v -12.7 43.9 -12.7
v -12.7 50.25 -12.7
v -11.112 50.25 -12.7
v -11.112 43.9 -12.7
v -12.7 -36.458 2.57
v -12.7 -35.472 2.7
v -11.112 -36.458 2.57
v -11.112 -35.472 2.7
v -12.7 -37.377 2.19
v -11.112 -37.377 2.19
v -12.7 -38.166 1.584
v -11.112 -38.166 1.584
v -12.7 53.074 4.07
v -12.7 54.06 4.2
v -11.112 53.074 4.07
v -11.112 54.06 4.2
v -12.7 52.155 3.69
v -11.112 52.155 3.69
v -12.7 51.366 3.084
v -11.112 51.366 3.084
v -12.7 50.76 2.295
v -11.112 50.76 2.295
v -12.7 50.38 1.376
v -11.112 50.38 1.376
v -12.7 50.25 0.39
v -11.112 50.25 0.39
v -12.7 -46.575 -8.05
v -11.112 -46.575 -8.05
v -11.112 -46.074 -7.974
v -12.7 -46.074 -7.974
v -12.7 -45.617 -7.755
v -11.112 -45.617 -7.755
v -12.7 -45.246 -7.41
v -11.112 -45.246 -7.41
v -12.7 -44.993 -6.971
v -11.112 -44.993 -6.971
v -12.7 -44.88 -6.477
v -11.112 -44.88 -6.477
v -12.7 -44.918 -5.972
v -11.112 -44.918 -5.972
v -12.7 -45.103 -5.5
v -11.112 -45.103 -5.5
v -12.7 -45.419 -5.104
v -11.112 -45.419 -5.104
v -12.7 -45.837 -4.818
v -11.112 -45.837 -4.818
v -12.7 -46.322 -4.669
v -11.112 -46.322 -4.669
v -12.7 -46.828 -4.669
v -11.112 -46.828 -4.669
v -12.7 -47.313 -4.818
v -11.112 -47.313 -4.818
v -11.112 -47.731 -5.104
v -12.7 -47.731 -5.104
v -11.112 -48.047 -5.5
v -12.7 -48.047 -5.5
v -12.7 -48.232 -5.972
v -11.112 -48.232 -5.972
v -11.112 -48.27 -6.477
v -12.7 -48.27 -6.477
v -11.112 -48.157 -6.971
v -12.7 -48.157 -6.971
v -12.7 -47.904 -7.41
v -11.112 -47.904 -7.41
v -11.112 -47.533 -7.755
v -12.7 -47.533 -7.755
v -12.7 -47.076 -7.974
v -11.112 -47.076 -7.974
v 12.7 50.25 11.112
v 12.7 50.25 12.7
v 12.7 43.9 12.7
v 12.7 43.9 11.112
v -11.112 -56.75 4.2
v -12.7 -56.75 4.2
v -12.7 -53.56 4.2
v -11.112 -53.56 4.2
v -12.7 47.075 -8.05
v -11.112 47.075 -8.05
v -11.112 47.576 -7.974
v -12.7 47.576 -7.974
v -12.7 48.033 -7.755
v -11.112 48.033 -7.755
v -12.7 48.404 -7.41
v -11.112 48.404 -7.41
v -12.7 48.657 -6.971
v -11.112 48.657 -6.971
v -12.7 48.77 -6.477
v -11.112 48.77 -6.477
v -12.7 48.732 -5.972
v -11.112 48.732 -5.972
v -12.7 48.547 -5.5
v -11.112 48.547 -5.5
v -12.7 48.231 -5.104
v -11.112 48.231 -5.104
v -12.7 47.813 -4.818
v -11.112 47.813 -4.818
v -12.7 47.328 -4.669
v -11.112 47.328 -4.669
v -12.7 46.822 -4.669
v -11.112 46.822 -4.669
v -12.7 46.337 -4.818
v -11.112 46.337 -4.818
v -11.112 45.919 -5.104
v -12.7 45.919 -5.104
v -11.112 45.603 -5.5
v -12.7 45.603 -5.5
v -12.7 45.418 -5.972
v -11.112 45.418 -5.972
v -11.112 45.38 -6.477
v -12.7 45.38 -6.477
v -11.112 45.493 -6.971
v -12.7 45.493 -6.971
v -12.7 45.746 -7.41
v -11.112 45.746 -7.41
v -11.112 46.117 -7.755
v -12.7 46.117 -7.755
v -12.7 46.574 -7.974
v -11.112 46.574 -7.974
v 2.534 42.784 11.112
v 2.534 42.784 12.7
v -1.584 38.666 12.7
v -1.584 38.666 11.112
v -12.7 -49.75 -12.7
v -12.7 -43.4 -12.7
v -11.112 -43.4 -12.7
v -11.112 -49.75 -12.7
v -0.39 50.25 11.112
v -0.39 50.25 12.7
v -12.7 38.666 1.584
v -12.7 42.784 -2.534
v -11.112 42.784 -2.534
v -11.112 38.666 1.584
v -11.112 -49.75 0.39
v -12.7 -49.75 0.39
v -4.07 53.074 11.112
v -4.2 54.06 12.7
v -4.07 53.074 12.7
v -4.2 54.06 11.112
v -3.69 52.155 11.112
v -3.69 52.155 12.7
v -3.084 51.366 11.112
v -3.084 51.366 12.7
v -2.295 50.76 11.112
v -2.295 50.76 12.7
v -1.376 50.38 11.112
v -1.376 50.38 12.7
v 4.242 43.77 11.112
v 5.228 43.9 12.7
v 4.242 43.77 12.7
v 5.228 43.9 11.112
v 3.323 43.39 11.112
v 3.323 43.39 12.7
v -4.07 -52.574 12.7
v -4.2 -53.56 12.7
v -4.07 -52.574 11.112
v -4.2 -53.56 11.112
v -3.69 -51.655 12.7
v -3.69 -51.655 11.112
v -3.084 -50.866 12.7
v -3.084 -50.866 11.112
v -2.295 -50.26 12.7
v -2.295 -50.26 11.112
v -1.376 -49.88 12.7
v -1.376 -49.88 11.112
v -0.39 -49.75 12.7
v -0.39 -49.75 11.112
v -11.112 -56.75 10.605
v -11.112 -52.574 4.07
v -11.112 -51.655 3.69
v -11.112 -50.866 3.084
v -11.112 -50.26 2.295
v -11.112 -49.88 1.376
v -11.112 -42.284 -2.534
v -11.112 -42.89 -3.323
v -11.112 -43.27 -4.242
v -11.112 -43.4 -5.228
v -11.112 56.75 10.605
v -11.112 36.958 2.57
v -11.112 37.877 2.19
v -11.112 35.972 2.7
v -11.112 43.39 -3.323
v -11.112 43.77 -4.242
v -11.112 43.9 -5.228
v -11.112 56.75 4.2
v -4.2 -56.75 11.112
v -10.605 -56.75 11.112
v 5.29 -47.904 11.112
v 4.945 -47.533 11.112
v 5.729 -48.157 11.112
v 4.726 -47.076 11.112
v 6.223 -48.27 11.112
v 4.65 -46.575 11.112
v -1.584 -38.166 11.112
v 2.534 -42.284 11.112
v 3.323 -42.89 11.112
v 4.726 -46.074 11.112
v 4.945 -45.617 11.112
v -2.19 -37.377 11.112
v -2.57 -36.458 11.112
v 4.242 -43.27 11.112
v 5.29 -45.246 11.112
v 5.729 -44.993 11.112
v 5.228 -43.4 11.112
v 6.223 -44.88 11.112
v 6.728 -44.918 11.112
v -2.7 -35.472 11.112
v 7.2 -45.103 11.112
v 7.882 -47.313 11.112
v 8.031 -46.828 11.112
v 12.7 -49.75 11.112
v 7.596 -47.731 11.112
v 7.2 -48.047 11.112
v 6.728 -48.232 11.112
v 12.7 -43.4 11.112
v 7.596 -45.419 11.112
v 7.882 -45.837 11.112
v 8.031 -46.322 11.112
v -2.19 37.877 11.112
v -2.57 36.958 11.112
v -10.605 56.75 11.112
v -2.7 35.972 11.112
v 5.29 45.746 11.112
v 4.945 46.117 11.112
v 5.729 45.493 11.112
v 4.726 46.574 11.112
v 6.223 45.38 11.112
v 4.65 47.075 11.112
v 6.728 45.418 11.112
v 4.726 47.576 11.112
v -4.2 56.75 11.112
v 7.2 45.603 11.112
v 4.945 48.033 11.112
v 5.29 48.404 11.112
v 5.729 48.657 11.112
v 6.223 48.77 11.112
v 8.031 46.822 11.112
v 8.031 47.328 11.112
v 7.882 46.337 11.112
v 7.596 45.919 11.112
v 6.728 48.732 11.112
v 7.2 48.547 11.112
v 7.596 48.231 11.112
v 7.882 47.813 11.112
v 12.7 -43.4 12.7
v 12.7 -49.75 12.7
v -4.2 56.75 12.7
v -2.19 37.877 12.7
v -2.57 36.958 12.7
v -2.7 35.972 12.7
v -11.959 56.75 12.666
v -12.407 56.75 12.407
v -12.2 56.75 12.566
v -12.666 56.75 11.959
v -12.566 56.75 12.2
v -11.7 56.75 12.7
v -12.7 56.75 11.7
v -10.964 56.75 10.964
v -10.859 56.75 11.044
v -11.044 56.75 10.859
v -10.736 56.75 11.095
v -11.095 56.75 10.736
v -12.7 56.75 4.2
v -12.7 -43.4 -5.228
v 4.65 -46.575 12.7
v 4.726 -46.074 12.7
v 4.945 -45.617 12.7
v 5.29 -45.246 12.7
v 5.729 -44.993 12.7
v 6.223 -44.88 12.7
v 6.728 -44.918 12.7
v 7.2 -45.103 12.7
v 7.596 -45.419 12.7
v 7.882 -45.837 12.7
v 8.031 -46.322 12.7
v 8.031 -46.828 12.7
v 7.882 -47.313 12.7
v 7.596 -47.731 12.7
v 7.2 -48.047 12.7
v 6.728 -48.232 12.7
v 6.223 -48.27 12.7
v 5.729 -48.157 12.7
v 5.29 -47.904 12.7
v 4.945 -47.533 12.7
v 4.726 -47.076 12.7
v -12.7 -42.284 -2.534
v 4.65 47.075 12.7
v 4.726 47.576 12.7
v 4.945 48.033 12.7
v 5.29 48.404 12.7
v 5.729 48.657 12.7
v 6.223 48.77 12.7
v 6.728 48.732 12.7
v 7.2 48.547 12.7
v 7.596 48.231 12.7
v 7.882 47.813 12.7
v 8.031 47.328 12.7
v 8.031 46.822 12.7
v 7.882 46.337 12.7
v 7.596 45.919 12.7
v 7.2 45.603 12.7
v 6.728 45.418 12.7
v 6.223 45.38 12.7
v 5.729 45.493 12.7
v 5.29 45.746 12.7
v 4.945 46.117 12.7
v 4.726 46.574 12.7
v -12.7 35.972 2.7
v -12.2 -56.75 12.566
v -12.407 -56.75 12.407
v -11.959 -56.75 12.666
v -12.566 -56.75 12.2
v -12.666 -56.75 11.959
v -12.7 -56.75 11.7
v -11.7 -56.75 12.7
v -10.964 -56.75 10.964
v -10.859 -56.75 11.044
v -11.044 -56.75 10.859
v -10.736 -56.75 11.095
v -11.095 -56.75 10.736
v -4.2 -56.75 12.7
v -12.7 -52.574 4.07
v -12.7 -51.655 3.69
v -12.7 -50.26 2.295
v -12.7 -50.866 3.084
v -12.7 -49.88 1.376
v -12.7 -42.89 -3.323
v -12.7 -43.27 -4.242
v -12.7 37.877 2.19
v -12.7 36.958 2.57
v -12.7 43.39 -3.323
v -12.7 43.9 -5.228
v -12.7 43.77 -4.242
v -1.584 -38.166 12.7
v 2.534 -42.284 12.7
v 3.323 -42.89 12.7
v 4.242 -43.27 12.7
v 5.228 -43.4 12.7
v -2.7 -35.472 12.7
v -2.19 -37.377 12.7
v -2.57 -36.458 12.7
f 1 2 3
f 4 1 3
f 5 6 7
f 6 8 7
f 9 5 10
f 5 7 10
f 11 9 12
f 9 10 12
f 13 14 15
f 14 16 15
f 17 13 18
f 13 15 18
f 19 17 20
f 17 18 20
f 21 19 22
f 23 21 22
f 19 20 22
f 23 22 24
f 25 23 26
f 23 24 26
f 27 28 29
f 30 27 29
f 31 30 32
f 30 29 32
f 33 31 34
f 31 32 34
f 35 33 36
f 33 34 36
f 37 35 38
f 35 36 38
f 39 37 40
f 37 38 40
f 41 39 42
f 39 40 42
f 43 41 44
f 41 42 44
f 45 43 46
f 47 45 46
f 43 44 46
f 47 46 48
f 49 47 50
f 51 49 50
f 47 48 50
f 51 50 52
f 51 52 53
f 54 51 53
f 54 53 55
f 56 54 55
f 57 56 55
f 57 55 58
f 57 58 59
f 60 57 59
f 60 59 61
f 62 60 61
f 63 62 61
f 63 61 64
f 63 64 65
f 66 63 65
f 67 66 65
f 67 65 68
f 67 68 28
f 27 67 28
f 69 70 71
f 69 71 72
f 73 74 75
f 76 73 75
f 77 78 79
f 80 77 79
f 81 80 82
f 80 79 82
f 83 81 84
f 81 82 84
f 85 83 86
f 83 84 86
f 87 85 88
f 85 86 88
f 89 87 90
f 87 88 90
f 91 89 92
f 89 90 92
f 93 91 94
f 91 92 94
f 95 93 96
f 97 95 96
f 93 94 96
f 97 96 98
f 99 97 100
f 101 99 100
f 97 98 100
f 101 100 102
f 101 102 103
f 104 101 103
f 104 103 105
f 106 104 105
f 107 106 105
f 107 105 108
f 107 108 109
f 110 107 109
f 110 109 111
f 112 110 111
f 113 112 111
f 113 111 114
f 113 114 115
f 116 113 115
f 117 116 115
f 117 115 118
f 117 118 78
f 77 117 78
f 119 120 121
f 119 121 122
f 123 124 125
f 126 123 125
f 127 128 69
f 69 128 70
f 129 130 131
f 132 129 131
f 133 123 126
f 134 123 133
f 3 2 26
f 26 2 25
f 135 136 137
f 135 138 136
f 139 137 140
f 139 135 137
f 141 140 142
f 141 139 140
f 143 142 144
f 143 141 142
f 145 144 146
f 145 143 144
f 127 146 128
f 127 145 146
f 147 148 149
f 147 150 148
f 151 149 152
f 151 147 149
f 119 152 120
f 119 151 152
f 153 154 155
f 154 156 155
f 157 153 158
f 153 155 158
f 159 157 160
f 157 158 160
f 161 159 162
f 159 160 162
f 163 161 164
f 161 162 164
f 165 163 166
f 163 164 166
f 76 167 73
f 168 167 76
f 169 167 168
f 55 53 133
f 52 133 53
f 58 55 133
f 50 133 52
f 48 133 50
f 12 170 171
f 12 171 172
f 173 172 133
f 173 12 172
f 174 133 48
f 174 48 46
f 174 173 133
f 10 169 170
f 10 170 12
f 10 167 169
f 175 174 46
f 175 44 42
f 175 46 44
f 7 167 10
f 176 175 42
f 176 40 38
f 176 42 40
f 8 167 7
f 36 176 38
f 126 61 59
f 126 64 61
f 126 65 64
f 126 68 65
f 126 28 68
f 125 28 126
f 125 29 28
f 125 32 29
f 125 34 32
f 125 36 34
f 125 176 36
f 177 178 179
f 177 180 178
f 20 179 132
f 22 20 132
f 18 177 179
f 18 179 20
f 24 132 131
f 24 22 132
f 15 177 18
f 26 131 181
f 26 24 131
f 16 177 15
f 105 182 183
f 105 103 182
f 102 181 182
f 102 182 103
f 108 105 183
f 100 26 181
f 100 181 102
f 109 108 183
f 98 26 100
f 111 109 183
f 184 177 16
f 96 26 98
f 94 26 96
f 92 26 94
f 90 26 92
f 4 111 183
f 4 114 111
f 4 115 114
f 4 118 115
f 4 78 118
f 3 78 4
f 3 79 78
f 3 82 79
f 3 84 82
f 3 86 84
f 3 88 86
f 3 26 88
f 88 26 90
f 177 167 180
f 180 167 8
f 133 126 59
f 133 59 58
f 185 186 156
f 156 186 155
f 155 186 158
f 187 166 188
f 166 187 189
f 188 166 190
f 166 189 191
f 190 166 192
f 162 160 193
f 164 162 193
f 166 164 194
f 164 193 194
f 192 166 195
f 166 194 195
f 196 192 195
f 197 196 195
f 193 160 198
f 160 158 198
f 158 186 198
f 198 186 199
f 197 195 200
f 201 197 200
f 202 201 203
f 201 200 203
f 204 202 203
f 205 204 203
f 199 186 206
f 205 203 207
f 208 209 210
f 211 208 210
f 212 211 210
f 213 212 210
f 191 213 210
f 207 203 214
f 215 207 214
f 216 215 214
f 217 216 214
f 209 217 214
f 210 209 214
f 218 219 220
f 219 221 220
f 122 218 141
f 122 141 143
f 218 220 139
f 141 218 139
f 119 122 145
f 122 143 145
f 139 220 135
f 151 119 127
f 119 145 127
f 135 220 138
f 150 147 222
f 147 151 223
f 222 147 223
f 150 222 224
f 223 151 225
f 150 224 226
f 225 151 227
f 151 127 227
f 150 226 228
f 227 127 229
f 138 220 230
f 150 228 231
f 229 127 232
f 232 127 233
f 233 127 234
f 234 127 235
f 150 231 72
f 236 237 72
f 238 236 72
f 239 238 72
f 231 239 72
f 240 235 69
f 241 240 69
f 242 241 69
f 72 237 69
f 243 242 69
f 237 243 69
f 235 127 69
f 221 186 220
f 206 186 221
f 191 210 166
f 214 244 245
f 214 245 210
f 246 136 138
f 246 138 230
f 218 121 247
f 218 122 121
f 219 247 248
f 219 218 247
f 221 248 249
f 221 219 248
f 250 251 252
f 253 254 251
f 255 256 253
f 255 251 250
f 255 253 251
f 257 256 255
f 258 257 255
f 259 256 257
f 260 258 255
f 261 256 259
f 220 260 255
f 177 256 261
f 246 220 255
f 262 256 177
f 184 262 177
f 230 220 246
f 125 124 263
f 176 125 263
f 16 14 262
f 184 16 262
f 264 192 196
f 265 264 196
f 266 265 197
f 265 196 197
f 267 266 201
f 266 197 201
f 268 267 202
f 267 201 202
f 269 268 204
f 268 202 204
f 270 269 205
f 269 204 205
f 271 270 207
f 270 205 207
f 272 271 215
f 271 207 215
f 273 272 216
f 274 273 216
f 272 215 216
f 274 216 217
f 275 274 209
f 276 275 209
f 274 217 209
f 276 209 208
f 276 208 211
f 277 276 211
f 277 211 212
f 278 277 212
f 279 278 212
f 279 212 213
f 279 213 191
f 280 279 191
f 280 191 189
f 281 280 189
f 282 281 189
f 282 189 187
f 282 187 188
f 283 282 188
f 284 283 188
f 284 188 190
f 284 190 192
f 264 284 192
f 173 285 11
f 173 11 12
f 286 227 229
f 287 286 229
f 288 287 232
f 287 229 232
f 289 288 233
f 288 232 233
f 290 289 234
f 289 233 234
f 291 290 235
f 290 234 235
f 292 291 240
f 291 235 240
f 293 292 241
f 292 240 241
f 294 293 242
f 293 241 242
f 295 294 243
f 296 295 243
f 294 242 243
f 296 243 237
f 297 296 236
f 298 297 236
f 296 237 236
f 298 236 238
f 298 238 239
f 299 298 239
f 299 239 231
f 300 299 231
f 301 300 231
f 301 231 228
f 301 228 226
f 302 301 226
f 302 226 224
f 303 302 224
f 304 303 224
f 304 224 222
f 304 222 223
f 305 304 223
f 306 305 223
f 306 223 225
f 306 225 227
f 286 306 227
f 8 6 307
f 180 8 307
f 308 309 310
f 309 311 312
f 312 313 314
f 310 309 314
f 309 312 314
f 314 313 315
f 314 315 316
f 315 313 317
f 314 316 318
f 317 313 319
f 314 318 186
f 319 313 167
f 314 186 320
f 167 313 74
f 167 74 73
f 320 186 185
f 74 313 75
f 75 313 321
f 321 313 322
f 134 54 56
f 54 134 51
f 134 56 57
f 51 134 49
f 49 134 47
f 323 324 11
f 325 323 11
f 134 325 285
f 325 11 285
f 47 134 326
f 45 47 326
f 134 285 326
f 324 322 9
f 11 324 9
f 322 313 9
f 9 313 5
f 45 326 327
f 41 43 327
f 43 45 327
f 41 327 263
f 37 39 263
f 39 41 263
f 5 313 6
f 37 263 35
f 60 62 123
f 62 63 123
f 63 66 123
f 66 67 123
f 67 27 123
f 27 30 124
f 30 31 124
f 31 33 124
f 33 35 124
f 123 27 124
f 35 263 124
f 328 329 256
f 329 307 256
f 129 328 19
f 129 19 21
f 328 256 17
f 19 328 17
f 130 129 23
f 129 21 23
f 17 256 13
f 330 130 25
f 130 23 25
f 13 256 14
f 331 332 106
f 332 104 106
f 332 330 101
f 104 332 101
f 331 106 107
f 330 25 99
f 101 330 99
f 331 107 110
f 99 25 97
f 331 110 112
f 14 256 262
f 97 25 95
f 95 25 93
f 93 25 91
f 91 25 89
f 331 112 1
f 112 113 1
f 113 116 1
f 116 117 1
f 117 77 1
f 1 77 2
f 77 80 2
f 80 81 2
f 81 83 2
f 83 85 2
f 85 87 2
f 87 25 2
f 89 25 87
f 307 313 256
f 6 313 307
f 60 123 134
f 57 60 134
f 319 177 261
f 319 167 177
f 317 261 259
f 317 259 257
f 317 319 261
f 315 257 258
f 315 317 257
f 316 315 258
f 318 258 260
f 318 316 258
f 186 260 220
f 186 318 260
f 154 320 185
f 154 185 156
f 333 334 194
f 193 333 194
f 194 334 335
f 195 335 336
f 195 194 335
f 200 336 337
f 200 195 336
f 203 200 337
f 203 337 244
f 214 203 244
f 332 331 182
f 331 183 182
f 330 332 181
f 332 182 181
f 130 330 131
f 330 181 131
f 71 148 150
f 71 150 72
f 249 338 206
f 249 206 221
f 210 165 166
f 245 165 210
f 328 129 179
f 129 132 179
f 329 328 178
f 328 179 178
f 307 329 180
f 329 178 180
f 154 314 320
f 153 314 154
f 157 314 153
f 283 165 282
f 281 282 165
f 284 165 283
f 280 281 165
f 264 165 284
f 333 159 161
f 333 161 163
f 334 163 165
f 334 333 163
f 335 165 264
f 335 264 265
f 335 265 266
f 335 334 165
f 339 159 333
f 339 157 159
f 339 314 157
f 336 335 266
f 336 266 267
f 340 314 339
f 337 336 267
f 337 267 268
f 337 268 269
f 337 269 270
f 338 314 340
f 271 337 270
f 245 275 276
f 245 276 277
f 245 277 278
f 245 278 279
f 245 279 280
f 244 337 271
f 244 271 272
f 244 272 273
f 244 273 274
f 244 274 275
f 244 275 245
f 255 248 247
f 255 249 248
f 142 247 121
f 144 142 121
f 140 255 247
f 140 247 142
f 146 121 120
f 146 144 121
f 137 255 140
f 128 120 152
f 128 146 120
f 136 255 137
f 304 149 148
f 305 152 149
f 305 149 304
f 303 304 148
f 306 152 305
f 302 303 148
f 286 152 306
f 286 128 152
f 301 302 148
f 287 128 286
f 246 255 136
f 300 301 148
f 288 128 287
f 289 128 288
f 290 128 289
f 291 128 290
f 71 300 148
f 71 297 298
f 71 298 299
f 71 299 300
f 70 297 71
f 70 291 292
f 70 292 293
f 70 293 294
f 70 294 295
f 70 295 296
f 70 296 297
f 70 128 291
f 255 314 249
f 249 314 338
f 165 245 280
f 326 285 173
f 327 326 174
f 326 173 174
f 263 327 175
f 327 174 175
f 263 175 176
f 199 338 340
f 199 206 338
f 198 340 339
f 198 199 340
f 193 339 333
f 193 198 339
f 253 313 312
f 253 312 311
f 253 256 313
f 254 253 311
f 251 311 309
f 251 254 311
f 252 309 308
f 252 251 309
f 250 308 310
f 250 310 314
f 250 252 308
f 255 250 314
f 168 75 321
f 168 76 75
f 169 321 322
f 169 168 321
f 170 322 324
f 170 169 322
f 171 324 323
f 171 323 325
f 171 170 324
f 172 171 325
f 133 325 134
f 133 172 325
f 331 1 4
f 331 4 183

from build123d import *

# Parameters (mm, degrees)
SKETCH1_W            = 25.4
SKETCH1_H            = 25.4
BOSS_EXTRUDE1_DEPTH  = 56.75
SKETCH2_W            = 23.8125
SKETCH2_H            = 23.8125
CUT_EXTRUDE1_DEPTH   = 115.912270885
FILLET1_R            = 0.508
M3_CLEARANCE_HOLE1_D = 3.4
M3_CLEARANCE_HOLE2_D = 3.4
M3_CLEARANCE_HOLE3_D = 3.4
M3_CLEARANCE_HOLE4_D = 3.4
FILLET2_R            = 1
CUT_EXTRUDE2_REACH   = 65.459
SKETCH11_W           = 16.9
SKETCH11_H           = 6.499999954
SKETCH11_H_2         = 7
CUT_EXTRUDE3_REACH   = 65.459
SKETCH12_W           = 16.9
SKETCH12_H           = 6.5
SKETCH12_H_2         = 7
FILLET3_R            = 3.81
CUT_EXTRUDE4_REACH   = 65.459
SKETCH13_W           = 15.4
SKETCH13_H           = 87.3
CUT_EXTRUDE5_REACH   = 65.459
SKETCH14_W           = 15.4
SKETCH14_H           = 87.3
CHAMFER2_SIZE        = 6.35
FILLET5_R            = 3.81


with BuildPart() as part:
    # Sketch1 → Boss-Extrude1 (new, symmetric)
    with BuildSketch(Plane(origin=(0, 0, 0), x_dir=(1, 0, 0), z_dir=(0, 1, 0))):
        Rectangle(SKETCH1_W, SKETCH1_H)
    extrude(amount=BOSS_EXTRUDE1_DEPTH, both=True)

    # Sketch2 → Cut-Extrude1 (cut, through all)
    with BuildSketch(Plane(origin=(0, 56.75, 0), x_dir=(1, 0, 0), z_dir=(0, 1, 0))):
        with Locations((0.79375, 0.79375)):
            Rectangle(SKETCH2_W, SKETCH2_H)
    extrude(amount=-CUT_EXTRUDE1_DEPTH, mode=Mode.SUBTRACT)

    # Fillet1
    fillet1_edges = [part.edges().sort_by_distance(p)[0] for p in [
        (-11.1125, 0, 11.1125),
    ]]
    fillet(fillet1_edges, radius=FILLET1_R)

    # M3 Clearance Hole1 (through all)
    with Locations(Plane.XY.offset(12.7)):
        with Locations((6.35, 47.075)):
            Hole(M3_CLEARANCE_HOLE1_D / 2)

    # M3 Clearance Hole2 (through all)
    with Locations(Plane.ZY.offset(12.7)):
        with Locations((-6.35, 47.075)):
            Hole(M3_CLEARANCE_HOLE2_D / 2)

    # M3 Clearance Hole3 (through all)
    with Locations(Plane.XY.offset(12.7)):
        with Locations((6.35, -46.575)):
            Hole(M3_CLEARANCE_HOLE3_D / 2)

    # M3 Clearance Hole4 (through all)
    with Locations(Plane.ZY.offset(12.7)):
        with Locations((-6.35, -46.575)):
            Hole(M3_CLEARANCE_HOLE4_D / 2)

    # Fillet2
    fillet2_edges = [part.edges().sort_by_distance(p)[0] for p in [
        (-12.7, 0, 12.7),
    ]]
    fillet(fillet2_edges, radius=FILLET2_R)

    # Sketch11 → Cut-Extrude2 (cut, up to next)
    with BuildSketch(Plane.ZY.offset(12.7), mode=Mode.PRIVATE) as cut_extrude2_sk1:
        with Locations((-4.25, 53.500000023)):
            Rectangle(SKETCH11_W, SKETCH11_H)
    cut_extrude2_tool1 = extrude(cut_extrude2_sk1.sketch, amount=-CUT_EXTRUDE2_REACH, mode=Mode.PRIVATE) & part.part
    # Sketch11 → Cut-Extrude2 (cut, up to next)
    with BuildSketch(Plane.ZY.offset(12.7), mode=Mode.PRIVATE) as cut_extrude2_sk2:
        with Locations((-4.25, -53.25)):
            Rectangle(SKETCH11_W, SKETCH11_H_2)
    cut_extrude2_tool2 = extrude(cut_extrude2_sk2.sketch, amount=-CUT_EXTRUDE2_REACH, mode=Mode.PRIVATE) & part.part
    add(cut_extrude2_tool1.solids().sort_by_distance((-12.7, 53.5, -4.25))[0], mode=Mode.SUBTRACT)
    add(cut_extrude2_tool2.solids().sort_by_distance((-12.7, -53.25, -4.25))[0], mode=Mode.SUBTRACT)

    # Sketch12 → Cut-Extrude3 (cut, up to next)
    with BuildSketch(Plane.XY.offset(12.7), mode=Mode.PRIVATE) as cut_extrude3_sk1:
        with Locations((4.25, 53.5)):
            Rectangle(SKETCH12_W, SKETCH12_H)
    cut_extrude3_tool1 = extrude(cut_extrude3_sk1.sketch, amount=-CUT_EXTRUDE3_REACH, mode=Mode.PRIVATE) & part.part
    # Sketch12 → Cut-Extrude3 (cut, up to next)
    with BuildSketch(Plane.XY.offset(12.7), mode=Mode.PRIVATE) as cut_extrude3_sk2:
        with Locations((4.25, -53.25)):
            Rectangle(SKETCH12_W, SKETCH12_H_2)
    cut_extrude3_tool2 = extrude(cut_extrude3_sk2.sketch, amount=-CUT_EXTRUDE3_REACH, mode=Mode.PRIVATE) & part.part
    add(cut_extrude3_tool1.solids().sort_by_distance((4.25, 53.5, 12.7))[0], mode=Mode.SUBTRACT)
    add(cut_extrude3_tool2.solids().sort_by_distance((4.25, -53.25, 12.7))[0], mode=Mode.SUBTRACT)

    # Fillet3
    fillet3_edges = [part.edges().sort_by_distance(p)[0] for p in [
        (-4.2, 50.25, 11.90625),
        (-4.2, -49.75, 11.90625),
        (-11.90625, 50.250000046, 4.2),
        (-11.90625, -49.75, 4.2),
    ]]
    fillet(fillet3_edges, radius=FILLET3_R)

    # Sketch13 → Cut-Extrude4 (cut, up to next)
    with BuildSketch(Plane.ZY.offset(12.7), mode=Mode.PRIVATE) as cut_extrude4_sk1:
        with Locations((-5, 0.25)):
            Rectangle(SKETCH13_W, SKETCH13_H)
    cut_extrude4_tool1 = extrude(cut_extrude4_sk1.sketch, amount=-CUT_EXTRUDE4_REACH, mode=Mode.PRIVATE) & part.part
    add(cut_extrude4_tool1.solids().sort_by_distance((-12.7, 0.25, -5))[0], mode=Mode.SUBTRACT)

    # Sketch14 → Cut-Extrude5 (cut, up to next)
    with BuildSketch(Plane.XY.offset(12.7), mode=Mode.PRIVATE) as cut_extrude5_sk1:
        with Locations((5, 0.25)):
            Rectangle(SKETCH14_W, SKETCH14_H)
    cut_extrude5_tool1 = extrude(cut_extrude5_sk1.sketch, amount=-CUT_EXTRUDE5_REACH, mode=Mode.PRIVATE) & part.part
    add(cut_extrude5_tool1.solids().sort_by_distance((5, 0.25, 12.7))[0], mode=Mode.SUBTRACT)

    # Chamfer2
    chamfer2_edges = [part.edges().sort_by_distance(p)[0] for p in [
        (-11.90625, 43.9, 2.7),
        (-11.90625, -43.4, 2.7),
        (-2.7, -43.4, 11.90625),
        (-2.7, 43.9, 11.90625),
    ]]
    chamfer(chamfer2_edges, length=CHAMFER2_SIZE)

    # Fillet5
    fillet5_edges = [part.edges().sort_by_distance(p)[0] for p in [
        (-11.90625, 43.9, -3.65),
        (-11.90625, -37.05, 2.7),
        (-11.90625, 37.55, 2.7),
        (-2.7, -37.05, 11.90625),
        (-2.7, 37.55, 11.90625),
        (3.65, 43.9, 11.90625),
        (3.65, -43.4, 11.90625),
        (-11.90625, -43.4, -3.65),
    ]]
    fillet(fillet5_edges, radius=FILLET5_R)


solid = part.part
